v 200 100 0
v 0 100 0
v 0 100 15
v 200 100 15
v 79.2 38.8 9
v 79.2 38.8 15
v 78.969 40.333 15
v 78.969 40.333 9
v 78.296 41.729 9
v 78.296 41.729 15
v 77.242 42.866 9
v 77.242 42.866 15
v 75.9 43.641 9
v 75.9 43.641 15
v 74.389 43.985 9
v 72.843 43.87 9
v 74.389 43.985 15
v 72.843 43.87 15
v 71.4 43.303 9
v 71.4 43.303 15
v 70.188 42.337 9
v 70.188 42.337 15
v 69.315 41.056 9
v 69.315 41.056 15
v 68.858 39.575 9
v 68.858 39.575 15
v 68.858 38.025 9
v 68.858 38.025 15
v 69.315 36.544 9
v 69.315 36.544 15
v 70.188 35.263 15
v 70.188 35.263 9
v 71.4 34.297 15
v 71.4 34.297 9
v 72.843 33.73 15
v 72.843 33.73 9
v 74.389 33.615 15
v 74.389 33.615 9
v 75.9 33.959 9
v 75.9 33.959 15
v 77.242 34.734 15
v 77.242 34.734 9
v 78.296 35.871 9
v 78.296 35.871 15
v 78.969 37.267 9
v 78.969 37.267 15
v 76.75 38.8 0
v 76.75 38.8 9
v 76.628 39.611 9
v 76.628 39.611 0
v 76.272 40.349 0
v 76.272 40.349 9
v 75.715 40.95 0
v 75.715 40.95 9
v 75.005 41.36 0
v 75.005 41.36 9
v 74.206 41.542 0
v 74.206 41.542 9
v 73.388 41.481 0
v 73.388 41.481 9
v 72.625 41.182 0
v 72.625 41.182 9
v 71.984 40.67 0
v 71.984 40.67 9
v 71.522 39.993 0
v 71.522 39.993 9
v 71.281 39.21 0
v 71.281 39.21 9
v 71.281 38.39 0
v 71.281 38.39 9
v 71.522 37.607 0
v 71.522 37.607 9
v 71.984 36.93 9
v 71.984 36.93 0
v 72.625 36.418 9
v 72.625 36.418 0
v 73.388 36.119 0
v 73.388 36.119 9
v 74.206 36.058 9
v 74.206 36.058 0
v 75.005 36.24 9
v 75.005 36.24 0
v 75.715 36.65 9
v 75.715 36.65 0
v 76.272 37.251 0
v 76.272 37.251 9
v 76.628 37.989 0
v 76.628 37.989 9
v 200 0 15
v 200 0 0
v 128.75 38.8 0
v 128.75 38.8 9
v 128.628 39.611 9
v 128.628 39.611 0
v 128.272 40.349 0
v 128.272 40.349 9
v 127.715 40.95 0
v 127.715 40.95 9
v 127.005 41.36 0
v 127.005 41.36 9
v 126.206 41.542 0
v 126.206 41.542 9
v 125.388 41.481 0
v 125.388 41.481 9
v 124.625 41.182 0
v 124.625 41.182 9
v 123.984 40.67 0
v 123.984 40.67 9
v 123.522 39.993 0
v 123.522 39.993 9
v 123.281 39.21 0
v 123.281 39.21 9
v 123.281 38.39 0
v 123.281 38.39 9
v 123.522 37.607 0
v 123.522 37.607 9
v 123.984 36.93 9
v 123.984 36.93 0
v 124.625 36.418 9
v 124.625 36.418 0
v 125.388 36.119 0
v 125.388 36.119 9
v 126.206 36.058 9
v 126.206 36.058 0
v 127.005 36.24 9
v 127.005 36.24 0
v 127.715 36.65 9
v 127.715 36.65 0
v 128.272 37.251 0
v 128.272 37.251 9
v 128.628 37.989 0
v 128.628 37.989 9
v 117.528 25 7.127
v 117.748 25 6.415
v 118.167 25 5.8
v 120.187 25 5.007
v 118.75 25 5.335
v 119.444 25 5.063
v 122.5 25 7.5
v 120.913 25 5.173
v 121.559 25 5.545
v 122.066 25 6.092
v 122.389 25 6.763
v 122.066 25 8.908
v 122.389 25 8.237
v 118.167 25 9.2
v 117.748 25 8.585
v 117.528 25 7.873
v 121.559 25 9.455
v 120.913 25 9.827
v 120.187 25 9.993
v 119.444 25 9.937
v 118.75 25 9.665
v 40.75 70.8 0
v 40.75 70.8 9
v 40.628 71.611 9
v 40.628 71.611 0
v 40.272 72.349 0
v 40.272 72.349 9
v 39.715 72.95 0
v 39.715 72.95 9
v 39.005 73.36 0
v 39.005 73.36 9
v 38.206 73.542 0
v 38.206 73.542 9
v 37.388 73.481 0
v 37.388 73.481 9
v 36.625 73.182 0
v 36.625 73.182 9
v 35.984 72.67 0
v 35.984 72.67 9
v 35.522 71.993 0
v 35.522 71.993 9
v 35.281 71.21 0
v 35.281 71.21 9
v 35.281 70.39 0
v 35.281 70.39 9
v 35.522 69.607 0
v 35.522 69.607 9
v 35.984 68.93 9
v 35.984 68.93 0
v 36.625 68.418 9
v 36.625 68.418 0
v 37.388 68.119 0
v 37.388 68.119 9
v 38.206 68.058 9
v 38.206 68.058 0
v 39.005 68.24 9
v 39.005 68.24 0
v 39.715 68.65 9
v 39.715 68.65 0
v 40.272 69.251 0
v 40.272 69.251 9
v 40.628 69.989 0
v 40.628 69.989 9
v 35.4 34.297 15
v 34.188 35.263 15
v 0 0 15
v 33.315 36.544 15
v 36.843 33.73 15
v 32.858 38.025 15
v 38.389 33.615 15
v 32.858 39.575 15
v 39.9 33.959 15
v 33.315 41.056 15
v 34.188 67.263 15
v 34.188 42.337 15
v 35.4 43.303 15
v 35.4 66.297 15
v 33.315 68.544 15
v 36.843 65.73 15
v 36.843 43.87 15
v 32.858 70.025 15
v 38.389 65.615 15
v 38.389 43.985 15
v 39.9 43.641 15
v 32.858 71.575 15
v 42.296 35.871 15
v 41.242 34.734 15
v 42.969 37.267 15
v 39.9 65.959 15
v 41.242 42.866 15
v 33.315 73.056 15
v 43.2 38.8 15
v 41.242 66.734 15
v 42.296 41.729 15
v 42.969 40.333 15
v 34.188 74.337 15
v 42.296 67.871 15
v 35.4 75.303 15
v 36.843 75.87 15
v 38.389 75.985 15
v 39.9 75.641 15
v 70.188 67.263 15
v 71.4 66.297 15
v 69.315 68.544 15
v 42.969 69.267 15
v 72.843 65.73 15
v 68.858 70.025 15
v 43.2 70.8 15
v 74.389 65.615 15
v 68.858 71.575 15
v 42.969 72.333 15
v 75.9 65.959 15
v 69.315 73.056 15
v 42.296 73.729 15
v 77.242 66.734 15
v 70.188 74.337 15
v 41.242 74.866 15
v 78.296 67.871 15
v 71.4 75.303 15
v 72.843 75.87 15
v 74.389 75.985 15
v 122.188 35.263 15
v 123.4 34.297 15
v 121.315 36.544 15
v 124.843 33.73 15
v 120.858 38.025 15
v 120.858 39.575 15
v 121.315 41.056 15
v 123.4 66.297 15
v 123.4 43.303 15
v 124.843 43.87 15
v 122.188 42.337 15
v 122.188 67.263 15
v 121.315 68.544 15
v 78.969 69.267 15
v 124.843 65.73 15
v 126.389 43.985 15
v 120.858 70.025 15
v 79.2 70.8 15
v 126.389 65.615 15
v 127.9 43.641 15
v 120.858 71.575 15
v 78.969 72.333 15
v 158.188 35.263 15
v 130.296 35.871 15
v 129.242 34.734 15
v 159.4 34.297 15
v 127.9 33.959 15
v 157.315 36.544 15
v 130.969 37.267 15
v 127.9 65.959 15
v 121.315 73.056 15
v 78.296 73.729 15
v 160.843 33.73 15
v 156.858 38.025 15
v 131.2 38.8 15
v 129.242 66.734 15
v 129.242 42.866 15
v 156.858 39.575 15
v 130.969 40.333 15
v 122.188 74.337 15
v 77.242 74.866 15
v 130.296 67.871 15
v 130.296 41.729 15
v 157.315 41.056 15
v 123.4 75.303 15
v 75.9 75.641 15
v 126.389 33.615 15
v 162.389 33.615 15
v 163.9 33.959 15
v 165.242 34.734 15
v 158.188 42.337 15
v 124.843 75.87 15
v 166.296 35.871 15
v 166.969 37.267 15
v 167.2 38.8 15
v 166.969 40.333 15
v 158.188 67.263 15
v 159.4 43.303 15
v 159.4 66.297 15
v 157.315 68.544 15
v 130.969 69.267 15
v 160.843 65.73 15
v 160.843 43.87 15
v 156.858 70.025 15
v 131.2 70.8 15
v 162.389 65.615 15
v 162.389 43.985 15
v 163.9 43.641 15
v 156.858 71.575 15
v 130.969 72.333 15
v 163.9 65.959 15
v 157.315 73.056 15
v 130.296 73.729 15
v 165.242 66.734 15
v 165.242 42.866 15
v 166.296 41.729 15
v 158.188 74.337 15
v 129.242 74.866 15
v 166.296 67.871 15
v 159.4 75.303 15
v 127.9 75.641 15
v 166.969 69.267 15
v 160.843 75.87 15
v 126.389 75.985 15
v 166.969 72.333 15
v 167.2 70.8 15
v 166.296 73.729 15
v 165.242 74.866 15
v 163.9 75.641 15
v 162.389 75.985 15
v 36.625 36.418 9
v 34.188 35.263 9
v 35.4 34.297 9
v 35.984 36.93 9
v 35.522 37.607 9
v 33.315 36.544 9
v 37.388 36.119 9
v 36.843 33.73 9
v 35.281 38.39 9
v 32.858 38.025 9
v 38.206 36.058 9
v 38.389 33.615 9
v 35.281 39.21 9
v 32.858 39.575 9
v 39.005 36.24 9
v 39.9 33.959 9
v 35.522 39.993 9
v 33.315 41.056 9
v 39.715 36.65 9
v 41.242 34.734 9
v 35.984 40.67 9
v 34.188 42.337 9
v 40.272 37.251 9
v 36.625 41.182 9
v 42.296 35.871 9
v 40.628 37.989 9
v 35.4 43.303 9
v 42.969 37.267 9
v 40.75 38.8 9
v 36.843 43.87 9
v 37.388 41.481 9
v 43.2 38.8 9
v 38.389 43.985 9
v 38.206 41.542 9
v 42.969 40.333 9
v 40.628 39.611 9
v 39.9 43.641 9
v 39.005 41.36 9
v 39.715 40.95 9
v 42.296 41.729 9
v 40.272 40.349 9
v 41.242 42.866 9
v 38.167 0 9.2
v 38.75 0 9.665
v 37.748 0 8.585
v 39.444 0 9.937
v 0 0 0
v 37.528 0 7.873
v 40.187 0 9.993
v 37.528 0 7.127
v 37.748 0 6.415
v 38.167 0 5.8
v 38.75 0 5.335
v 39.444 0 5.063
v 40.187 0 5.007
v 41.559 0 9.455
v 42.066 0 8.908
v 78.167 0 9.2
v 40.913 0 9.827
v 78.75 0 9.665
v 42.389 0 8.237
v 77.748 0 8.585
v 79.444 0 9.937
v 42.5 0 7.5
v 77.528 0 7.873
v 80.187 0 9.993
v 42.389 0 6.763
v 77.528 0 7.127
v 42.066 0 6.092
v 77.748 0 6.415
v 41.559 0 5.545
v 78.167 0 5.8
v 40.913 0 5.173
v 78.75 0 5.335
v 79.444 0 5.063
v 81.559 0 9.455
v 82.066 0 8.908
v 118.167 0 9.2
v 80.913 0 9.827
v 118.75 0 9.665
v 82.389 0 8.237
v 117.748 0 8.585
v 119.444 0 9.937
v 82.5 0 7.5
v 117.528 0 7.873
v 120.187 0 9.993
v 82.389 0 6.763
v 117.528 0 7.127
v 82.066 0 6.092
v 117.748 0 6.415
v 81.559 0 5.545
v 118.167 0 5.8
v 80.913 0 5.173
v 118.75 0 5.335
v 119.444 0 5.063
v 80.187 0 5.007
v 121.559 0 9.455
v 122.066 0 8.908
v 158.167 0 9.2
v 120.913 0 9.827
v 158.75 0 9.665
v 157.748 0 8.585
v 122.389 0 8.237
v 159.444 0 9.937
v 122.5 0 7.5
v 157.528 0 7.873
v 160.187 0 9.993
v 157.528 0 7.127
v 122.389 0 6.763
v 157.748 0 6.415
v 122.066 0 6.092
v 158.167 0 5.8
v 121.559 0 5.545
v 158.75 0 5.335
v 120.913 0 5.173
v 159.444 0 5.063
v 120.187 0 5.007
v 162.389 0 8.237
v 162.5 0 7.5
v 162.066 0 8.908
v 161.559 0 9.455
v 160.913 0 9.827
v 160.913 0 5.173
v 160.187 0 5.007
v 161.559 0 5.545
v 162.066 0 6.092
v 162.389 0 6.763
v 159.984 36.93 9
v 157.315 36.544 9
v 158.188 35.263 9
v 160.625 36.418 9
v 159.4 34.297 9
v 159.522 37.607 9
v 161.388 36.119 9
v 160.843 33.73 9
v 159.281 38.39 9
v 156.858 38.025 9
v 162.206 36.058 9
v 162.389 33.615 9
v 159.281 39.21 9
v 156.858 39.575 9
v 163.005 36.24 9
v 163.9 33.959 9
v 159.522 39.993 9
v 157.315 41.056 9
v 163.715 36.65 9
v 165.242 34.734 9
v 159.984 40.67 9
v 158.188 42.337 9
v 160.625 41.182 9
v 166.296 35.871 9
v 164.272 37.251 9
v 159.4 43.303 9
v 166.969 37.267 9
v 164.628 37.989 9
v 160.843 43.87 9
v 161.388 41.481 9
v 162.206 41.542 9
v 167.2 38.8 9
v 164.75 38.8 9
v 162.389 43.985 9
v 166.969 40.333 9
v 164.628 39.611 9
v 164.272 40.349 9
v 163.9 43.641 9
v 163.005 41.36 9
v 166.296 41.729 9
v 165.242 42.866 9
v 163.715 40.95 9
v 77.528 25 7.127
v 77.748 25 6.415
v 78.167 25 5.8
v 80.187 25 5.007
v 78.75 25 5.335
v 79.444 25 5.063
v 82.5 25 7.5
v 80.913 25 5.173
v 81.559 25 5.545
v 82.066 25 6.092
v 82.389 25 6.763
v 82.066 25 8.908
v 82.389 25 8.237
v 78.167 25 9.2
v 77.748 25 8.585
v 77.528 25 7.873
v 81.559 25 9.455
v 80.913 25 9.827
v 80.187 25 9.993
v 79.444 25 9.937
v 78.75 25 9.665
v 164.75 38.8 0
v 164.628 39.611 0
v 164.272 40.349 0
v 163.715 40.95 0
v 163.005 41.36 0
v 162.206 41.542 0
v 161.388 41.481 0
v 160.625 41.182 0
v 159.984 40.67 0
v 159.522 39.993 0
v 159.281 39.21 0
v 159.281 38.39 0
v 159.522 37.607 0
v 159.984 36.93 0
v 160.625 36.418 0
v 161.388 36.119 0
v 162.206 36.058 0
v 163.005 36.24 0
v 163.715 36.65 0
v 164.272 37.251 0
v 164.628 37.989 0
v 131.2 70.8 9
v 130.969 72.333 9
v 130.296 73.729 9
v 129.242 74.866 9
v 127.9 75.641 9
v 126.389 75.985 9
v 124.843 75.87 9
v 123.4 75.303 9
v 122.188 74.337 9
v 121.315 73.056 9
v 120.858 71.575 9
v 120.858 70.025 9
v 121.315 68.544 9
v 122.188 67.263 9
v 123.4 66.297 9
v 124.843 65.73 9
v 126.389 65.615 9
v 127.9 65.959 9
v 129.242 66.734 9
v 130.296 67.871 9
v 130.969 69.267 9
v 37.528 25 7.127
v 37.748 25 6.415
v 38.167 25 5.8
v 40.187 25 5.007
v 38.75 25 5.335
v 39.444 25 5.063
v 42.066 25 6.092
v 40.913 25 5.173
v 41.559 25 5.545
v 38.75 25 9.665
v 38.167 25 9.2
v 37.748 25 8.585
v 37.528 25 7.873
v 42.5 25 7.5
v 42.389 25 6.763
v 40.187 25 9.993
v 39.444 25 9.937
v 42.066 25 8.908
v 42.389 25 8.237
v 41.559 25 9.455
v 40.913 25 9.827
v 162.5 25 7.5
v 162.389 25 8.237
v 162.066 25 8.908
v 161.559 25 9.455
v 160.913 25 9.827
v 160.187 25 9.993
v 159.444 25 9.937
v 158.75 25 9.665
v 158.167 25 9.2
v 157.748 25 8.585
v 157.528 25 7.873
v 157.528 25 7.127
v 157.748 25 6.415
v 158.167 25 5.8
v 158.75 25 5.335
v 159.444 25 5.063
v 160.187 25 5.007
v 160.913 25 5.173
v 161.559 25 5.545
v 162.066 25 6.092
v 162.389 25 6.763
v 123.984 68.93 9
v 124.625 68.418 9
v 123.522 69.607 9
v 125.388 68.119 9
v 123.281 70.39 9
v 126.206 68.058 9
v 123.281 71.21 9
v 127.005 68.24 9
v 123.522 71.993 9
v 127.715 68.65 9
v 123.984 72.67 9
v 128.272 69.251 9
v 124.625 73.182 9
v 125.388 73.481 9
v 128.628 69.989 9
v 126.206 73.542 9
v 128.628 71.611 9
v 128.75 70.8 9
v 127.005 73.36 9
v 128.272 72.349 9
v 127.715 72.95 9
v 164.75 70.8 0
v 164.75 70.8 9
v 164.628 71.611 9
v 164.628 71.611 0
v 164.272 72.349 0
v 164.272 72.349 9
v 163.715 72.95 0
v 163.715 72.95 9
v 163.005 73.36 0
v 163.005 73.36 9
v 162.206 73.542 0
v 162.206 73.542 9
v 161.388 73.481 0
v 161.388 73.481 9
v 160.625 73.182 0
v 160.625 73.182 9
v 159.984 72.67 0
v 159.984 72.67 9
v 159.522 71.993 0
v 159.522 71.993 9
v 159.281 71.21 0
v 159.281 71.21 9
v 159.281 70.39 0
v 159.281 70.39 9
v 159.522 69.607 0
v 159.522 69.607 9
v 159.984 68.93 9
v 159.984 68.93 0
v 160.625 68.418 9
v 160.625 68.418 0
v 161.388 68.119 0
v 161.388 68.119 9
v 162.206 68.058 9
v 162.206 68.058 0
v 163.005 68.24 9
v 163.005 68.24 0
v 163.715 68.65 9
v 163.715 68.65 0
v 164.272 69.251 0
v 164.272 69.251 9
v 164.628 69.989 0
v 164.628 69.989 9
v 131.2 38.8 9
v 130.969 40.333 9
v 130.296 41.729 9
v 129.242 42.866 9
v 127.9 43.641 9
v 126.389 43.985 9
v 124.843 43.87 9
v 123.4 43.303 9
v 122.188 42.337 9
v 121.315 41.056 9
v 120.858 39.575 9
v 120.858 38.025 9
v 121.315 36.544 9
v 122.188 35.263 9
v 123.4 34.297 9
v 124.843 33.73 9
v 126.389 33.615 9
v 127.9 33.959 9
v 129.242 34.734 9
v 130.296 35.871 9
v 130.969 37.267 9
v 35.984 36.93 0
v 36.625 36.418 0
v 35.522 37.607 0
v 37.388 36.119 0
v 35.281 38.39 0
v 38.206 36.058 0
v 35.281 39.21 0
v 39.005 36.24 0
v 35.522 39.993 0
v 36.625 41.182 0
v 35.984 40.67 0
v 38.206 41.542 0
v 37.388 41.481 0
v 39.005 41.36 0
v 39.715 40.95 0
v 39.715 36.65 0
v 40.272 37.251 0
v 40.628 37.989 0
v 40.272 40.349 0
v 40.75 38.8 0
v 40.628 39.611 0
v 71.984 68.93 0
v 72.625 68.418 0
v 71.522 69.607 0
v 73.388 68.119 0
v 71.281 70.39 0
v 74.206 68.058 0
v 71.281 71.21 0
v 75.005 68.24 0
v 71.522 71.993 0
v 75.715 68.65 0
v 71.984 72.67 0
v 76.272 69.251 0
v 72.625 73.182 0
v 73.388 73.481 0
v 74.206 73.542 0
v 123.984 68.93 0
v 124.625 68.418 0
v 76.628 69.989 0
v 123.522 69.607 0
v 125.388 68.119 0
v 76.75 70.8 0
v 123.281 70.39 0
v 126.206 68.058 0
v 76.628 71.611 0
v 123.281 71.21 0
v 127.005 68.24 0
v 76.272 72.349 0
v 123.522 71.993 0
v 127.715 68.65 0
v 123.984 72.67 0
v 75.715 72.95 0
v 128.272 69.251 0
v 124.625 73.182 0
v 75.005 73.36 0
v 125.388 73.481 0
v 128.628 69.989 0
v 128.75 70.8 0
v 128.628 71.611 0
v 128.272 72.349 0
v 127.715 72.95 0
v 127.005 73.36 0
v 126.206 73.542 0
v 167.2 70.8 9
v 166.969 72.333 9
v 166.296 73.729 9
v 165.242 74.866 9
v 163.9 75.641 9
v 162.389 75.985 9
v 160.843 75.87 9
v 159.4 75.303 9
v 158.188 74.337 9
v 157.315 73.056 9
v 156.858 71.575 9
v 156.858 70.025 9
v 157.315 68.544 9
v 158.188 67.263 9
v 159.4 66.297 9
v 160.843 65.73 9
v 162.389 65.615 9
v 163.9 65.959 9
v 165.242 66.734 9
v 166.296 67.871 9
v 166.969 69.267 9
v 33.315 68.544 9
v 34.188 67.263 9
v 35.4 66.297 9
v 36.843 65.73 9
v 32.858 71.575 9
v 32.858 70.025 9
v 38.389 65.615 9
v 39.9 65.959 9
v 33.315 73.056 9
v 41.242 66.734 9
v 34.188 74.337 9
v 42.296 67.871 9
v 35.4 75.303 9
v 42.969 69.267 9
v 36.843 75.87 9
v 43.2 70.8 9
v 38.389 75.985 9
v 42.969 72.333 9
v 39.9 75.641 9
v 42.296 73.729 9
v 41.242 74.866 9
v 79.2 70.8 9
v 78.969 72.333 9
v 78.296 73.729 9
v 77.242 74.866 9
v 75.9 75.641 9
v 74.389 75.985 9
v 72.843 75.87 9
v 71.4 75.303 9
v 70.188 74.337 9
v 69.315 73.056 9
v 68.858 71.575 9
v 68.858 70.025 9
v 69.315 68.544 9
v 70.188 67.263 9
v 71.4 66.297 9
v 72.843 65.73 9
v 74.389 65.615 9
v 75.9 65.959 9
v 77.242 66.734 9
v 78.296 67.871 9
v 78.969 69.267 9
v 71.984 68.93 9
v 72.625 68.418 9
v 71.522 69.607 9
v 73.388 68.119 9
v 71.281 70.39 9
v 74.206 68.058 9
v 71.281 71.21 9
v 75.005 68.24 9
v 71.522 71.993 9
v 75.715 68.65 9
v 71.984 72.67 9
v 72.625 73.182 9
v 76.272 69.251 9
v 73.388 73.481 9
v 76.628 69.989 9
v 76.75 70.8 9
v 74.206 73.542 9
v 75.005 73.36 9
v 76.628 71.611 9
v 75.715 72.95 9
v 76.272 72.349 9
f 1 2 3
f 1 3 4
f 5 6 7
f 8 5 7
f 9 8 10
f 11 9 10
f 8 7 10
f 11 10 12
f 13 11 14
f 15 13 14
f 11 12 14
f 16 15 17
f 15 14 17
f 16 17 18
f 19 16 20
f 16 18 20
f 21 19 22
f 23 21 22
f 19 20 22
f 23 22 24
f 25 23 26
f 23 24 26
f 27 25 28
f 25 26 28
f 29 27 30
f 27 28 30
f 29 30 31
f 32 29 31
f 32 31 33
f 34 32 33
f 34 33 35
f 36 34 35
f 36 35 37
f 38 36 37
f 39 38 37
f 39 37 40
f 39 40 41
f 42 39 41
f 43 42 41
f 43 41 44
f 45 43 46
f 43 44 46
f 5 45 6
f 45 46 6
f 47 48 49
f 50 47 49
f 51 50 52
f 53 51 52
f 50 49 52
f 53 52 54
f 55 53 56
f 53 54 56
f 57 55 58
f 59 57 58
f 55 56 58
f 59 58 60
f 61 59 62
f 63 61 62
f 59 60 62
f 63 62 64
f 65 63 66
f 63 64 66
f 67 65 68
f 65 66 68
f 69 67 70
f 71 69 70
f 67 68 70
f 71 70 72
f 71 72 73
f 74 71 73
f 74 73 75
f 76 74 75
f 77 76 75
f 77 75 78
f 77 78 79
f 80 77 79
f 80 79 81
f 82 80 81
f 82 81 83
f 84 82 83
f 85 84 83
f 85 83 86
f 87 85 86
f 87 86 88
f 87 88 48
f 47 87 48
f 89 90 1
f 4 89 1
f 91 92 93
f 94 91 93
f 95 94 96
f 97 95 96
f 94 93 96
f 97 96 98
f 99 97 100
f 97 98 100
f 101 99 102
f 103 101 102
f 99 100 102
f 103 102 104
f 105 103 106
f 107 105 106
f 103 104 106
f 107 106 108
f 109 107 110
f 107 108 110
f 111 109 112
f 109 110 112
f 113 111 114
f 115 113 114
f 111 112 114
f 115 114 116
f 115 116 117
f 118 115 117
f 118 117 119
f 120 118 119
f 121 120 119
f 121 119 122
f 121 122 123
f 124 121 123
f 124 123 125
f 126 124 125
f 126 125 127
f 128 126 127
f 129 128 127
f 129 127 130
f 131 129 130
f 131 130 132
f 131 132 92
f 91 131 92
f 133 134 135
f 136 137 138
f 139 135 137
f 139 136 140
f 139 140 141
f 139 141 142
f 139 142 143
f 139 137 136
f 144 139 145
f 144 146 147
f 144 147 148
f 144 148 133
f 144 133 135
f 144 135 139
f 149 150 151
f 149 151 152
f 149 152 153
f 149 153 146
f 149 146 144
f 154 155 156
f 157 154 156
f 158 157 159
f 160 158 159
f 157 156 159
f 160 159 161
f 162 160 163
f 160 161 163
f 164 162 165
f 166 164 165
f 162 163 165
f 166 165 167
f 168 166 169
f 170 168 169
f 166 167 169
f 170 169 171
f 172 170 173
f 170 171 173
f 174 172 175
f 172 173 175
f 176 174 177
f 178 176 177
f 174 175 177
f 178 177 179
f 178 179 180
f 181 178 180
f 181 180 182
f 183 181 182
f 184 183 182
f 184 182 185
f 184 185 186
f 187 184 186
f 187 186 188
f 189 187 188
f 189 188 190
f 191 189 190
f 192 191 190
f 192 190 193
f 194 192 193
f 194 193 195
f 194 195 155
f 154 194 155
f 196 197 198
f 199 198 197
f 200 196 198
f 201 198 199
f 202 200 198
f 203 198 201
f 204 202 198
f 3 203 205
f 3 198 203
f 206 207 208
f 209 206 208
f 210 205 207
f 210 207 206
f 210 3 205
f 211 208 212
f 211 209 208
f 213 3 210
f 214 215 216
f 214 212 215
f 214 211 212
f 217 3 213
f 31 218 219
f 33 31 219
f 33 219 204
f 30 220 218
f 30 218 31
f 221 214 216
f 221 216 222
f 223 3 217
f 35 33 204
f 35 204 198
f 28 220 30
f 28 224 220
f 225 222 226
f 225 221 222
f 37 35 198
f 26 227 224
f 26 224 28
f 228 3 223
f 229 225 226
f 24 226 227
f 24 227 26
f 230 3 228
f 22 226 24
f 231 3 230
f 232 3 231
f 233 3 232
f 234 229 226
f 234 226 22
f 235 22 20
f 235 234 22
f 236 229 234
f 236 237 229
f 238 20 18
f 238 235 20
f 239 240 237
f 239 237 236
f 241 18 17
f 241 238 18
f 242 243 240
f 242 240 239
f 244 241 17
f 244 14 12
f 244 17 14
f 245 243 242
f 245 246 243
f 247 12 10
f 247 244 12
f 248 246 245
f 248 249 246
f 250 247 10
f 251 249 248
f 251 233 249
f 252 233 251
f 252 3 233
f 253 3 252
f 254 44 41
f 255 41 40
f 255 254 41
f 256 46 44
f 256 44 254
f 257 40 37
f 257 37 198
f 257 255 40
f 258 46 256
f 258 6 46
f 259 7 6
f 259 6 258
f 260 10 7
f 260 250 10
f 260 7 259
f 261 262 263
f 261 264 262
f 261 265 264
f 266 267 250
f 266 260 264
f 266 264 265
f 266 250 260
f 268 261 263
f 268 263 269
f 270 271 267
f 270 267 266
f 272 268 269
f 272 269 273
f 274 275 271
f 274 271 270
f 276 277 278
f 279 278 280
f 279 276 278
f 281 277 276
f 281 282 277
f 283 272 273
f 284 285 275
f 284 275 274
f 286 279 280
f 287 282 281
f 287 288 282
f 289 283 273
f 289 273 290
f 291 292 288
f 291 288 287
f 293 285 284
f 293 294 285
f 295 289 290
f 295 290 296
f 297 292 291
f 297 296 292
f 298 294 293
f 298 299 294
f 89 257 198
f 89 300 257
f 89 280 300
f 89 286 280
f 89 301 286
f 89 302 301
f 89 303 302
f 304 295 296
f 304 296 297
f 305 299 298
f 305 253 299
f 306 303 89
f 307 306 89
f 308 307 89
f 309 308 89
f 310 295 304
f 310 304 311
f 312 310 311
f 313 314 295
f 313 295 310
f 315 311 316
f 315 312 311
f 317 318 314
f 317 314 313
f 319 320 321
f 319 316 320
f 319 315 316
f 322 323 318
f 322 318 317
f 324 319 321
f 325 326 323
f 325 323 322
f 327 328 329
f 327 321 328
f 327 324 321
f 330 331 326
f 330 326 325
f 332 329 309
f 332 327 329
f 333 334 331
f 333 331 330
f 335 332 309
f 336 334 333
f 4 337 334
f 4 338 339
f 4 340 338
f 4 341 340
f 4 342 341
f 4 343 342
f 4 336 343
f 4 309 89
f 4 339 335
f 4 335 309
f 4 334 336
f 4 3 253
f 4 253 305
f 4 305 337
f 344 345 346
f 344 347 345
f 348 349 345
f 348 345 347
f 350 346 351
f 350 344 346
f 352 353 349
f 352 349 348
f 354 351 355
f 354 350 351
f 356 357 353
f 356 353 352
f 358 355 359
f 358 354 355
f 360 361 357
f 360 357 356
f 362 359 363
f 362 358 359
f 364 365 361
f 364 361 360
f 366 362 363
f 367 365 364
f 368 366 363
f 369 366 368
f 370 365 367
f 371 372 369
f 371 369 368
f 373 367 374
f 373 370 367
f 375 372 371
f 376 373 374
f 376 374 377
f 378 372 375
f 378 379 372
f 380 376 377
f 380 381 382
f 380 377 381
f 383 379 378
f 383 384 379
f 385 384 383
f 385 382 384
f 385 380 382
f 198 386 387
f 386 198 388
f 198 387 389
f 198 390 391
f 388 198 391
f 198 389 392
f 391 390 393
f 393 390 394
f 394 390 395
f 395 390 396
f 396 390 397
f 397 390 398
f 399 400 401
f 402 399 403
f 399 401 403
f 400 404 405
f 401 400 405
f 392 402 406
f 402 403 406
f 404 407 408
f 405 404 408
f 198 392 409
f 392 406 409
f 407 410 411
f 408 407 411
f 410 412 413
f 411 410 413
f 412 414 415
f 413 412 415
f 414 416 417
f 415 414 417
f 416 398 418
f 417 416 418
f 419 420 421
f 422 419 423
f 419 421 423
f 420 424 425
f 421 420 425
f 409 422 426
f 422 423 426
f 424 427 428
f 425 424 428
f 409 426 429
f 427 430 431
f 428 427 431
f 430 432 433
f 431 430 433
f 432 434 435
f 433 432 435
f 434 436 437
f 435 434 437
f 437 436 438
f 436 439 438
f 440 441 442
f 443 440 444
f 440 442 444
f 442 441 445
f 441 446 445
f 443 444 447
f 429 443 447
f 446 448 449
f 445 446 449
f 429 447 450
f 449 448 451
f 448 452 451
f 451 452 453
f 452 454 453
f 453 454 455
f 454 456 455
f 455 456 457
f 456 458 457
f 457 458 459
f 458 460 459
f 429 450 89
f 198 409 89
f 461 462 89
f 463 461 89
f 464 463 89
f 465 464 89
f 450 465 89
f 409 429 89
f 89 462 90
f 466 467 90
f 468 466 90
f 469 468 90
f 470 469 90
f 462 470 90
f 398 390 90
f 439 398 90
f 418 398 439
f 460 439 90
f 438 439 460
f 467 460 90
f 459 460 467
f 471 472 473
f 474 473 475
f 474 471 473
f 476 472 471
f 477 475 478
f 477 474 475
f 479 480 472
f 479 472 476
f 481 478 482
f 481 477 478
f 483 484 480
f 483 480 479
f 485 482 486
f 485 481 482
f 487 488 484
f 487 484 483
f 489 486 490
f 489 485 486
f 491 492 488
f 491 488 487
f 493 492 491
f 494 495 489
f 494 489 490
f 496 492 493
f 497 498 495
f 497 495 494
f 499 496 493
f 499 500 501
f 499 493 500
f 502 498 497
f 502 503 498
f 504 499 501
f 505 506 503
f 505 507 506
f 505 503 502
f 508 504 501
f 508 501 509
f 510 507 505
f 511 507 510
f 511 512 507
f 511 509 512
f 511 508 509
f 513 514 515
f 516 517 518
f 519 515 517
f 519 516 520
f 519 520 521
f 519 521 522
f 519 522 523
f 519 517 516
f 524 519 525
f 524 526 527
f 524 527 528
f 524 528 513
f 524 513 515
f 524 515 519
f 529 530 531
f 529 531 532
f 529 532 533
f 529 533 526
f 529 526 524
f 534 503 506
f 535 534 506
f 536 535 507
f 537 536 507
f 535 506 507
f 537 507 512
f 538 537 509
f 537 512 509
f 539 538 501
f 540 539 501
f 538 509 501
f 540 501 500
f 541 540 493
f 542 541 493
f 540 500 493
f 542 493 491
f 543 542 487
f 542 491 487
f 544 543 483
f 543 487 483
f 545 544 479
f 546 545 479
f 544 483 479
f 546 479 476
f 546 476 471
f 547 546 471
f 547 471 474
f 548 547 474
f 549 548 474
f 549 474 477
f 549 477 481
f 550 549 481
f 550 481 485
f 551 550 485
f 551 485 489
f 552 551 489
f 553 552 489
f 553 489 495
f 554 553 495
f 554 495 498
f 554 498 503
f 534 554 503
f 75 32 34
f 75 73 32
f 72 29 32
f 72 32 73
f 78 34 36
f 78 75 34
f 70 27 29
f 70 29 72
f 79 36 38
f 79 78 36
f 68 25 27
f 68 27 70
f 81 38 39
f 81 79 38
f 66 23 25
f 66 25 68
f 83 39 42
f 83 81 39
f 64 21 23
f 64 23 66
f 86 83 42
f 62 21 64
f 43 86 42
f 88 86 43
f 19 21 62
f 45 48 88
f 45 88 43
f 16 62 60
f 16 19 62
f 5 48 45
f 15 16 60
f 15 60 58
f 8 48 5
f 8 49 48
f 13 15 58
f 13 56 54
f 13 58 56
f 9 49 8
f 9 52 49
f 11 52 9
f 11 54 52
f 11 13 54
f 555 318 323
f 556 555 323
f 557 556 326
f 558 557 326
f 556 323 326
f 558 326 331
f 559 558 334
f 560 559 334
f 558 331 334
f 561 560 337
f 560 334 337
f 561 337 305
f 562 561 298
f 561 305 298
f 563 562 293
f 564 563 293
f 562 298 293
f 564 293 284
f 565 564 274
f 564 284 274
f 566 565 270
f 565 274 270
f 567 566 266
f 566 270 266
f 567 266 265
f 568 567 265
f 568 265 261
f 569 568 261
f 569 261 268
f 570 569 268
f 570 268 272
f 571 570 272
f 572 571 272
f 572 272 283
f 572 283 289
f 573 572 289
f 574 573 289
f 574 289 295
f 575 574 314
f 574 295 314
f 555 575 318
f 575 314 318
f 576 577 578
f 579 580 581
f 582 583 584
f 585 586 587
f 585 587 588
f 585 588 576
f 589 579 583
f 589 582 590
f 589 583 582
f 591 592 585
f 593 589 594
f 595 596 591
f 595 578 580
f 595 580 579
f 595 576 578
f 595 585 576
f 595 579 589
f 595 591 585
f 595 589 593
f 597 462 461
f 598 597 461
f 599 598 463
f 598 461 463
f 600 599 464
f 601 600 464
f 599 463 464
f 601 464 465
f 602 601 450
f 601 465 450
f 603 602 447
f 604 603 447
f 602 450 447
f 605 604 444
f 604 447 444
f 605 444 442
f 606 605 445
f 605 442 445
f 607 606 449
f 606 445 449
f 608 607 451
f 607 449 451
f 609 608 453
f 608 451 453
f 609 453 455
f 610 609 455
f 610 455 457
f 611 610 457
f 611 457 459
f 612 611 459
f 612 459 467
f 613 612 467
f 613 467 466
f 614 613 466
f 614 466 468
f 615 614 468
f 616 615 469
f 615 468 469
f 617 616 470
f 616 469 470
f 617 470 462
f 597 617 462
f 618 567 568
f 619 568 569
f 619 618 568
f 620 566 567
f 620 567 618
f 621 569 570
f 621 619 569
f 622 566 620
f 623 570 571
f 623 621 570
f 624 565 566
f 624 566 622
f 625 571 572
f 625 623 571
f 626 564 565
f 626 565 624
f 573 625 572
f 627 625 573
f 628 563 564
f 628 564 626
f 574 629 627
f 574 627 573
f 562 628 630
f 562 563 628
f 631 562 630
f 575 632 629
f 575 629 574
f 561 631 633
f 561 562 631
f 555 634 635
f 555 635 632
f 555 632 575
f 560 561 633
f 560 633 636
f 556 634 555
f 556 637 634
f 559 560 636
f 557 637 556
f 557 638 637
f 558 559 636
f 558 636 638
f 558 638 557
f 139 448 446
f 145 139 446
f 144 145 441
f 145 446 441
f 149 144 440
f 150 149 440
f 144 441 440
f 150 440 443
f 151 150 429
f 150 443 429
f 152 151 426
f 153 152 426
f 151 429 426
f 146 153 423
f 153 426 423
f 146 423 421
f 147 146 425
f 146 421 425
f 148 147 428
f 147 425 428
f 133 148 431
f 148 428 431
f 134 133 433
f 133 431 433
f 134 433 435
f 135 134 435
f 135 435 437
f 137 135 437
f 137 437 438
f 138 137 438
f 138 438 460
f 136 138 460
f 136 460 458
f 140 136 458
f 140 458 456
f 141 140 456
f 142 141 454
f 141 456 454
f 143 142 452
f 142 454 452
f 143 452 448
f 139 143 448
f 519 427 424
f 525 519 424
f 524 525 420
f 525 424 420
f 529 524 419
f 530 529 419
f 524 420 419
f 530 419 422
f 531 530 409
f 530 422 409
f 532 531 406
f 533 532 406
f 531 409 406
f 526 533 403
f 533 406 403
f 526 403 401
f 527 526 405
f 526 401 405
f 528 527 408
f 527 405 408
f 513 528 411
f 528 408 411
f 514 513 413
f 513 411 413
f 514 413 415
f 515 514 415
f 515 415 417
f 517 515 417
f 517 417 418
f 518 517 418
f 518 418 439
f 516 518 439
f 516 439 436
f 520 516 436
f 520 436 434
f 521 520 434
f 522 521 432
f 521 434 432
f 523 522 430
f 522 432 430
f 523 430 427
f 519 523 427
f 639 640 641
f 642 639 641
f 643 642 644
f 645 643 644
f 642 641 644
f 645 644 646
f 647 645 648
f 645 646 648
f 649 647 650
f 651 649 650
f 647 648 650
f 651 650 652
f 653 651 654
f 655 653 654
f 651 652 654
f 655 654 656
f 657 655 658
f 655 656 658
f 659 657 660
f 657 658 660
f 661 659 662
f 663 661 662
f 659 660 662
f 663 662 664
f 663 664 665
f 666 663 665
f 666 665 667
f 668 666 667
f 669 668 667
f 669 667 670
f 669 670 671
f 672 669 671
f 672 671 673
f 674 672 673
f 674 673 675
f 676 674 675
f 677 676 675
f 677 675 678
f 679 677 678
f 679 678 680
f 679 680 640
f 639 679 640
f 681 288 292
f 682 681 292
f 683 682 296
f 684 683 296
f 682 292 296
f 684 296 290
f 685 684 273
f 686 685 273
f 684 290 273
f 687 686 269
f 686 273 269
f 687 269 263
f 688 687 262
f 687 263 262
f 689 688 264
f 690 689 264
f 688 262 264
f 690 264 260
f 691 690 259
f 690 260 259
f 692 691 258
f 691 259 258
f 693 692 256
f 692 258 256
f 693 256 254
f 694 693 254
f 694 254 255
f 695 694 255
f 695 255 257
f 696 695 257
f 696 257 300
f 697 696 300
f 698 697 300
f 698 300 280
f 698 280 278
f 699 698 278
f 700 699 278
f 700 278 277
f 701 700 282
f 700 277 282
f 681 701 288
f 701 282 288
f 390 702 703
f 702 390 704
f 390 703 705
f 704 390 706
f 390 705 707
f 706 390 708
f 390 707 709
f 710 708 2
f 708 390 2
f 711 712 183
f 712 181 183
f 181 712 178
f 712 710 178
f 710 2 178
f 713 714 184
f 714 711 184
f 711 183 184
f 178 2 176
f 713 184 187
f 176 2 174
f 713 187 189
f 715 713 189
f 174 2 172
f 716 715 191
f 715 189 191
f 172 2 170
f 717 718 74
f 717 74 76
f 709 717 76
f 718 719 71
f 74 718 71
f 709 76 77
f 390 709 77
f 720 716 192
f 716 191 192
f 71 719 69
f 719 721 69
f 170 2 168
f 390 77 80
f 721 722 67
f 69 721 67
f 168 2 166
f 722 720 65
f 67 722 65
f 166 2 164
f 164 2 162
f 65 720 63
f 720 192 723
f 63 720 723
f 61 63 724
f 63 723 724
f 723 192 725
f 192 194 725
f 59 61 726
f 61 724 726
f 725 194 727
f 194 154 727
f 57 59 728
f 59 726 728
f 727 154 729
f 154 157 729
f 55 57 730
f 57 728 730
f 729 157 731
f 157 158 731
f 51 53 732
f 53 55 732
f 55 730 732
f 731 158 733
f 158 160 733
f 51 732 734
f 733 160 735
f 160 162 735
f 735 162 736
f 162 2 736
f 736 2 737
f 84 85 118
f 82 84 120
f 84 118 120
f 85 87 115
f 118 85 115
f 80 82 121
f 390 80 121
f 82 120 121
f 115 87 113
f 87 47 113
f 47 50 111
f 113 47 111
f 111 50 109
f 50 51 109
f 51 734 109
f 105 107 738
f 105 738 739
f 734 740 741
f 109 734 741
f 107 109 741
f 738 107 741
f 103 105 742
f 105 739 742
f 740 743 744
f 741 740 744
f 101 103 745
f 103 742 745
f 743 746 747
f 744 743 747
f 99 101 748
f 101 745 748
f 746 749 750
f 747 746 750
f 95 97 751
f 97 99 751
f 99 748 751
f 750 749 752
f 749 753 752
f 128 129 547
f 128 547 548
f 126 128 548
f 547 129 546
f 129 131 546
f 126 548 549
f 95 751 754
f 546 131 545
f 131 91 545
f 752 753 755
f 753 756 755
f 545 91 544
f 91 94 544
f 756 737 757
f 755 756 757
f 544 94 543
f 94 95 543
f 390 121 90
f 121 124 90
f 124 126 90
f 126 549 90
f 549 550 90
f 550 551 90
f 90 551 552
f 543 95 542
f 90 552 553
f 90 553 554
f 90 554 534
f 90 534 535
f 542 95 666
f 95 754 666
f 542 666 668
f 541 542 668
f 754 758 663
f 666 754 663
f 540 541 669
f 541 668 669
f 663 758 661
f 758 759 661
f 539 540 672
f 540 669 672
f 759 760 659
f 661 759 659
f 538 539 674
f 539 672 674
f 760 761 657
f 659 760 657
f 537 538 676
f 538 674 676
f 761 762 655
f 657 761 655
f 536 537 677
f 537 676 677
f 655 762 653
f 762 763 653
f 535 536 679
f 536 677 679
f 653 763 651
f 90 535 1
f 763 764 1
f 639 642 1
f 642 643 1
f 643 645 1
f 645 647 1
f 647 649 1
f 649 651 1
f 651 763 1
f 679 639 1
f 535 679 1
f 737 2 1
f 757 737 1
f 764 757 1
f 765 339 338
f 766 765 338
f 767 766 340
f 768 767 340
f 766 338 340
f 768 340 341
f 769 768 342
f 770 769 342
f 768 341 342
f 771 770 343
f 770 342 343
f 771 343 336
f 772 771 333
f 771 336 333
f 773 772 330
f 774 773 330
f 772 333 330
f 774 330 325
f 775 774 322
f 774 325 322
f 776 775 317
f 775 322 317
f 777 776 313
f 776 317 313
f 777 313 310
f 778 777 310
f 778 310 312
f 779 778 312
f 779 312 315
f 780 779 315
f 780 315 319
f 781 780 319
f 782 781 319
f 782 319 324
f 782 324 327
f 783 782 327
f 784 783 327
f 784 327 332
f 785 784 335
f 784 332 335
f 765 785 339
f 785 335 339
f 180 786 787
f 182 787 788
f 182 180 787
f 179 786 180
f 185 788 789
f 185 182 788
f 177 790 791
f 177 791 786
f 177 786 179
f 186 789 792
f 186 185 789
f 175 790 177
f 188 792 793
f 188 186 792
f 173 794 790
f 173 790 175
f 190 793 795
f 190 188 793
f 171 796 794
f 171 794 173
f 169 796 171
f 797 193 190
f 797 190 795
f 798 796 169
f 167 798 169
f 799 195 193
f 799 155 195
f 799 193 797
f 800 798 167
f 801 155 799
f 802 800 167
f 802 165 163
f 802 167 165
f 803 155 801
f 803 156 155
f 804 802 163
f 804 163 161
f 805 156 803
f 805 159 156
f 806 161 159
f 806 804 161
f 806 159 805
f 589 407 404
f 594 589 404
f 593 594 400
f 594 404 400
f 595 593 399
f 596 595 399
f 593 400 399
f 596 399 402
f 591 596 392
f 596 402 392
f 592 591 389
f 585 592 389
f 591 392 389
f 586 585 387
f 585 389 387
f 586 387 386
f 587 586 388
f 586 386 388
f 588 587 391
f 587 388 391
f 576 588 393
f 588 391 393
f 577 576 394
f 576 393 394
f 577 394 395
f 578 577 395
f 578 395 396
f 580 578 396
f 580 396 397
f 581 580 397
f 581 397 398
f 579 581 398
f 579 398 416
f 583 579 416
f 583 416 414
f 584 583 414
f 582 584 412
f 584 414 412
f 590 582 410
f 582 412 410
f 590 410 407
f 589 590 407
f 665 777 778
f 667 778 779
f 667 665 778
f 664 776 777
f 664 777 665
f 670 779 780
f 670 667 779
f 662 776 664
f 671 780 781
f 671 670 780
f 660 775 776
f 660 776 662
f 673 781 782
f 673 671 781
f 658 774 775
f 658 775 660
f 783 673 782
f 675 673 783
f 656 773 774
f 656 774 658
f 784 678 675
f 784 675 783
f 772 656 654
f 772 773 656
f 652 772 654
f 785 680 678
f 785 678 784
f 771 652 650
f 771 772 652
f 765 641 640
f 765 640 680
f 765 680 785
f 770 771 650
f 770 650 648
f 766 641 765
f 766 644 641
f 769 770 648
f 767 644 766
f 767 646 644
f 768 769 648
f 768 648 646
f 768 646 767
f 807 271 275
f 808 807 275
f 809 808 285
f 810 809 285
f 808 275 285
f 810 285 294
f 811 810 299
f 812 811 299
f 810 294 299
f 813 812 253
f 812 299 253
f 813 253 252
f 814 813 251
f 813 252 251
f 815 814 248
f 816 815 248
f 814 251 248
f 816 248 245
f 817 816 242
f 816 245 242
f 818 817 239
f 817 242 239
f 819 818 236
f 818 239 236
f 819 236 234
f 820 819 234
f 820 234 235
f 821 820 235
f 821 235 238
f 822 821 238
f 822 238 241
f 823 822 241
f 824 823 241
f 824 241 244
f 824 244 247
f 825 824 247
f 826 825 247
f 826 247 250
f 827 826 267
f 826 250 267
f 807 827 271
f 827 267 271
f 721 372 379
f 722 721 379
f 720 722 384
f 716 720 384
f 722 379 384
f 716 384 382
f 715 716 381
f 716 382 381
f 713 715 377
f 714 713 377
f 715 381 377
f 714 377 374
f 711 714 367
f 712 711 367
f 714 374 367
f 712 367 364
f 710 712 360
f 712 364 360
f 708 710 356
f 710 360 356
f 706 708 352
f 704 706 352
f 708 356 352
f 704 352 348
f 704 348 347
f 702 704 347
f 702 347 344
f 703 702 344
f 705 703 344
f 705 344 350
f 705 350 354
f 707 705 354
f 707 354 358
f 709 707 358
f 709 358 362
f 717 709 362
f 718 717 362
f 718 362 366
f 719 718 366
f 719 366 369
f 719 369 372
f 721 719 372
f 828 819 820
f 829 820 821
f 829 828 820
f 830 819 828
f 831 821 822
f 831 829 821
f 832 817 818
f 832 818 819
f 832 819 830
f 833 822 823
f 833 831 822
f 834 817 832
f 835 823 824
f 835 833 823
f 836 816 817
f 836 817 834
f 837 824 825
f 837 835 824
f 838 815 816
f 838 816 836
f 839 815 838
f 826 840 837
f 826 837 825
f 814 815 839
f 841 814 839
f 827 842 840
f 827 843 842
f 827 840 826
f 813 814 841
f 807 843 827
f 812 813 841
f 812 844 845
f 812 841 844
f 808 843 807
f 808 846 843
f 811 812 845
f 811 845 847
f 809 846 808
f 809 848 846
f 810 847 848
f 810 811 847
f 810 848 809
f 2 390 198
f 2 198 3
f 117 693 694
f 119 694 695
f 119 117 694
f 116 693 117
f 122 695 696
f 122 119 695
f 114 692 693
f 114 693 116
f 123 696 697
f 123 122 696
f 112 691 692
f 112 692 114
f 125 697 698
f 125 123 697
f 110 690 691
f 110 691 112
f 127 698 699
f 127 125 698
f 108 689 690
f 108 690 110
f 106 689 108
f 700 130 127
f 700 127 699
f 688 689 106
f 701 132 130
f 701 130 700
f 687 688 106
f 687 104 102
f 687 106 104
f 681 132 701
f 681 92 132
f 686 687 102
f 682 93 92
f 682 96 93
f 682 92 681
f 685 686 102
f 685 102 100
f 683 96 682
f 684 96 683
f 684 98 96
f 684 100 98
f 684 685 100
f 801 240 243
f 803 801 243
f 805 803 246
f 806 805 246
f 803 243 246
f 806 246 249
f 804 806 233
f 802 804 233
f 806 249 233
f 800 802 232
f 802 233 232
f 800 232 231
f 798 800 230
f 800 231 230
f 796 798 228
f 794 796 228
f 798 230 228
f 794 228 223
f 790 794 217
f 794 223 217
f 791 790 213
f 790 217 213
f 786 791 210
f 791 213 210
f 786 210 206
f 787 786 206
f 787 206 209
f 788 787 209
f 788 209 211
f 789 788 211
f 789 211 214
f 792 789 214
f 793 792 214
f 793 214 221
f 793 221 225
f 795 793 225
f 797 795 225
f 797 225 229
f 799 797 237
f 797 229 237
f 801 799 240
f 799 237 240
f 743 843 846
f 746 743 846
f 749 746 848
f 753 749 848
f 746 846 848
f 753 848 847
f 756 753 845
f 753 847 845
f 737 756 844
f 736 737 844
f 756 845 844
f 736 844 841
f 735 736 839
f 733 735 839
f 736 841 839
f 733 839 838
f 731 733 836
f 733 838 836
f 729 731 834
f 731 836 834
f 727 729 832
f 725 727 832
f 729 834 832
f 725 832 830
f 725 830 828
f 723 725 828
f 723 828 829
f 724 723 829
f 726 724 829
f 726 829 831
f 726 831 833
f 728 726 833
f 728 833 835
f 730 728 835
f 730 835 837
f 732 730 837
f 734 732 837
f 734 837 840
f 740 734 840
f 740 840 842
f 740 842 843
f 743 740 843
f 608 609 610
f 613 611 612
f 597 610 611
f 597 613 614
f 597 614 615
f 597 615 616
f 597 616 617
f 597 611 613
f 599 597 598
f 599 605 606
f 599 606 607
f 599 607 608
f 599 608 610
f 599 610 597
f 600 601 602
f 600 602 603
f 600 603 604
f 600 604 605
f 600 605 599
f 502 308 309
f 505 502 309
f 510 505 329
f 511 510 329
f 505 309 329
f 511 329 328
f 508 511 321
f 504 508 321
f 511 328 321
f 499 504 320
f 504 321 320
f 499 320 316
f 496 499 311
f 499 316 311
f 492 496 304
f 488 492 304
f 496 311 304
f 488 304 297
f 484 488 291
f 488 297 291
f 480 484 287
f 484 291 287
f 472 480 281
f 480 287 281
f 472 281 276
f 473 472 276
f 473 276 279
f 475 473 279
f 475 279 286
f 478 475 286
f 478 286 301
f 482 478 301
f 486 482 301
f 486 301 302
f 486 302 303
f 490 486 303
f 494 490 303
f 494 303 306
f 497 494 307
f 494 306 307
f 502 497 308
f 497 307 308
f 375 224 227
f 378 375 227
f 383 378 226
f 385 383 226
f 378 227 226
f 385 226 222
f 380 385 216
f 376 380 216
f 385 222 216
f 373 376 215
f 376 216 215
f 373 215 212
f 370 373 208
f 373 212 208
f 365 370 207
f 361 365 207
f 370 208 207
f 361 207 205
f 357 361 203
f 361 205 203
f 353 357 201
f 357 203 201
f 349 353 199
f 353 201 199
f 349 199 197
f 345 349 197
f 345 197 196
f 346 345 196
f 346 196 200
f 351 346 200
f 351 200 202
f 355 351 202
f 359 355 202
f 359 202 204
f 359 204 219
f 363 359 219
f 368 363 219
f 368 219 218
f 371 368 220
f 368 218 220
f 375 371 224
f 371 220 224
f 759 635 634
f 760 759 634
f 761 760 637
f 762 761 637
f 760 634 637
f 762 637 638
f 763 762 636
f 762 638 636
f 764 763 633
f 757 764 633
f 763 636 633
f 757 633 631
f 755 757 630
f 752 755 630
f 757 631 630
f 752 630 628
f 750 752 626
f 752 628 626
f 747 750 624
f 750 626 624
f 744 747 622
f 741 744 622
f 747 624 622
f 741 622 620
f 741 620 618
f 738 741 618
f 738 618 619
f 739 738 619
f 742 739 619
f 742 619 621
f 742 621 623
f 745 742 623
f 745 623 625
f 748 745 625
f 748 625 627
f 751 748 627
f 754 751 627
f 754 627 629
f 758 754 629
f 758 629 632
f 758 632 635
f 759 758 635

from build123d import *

# Parameters (mm, degrees)
SKETCH_W        = 200
SKETCH_H        = 100
PAD_DEPTH       = 15
SKETCH001_R     = 2.75
POCKET_DEPTH    = 15
SKETCH002_R     = 5.2
POCKET001_DEPTH = 6
SKETCH003_R     = 2.5
POCKET002_DEPTH = 25


with BuildPart() as part:
    # Sketch → Pad (new body)
    with BuildSketch(Plane.XY):
        with Locations((100, 50)):
            Rectangle(SKETCH_W, SKETCH_H)
    extrude(amount=PAD_DEPTH)

    # Sketch001 (on Face6 of Pad) → Pocket (cut)
    with BuildSketch(Plane.XY.offset(15)):
        with Locations((162, 70.8)):
            Circle(SKETCH001_R)
        with Locations((162, 38.8)):
            Circle(SKETCH001_R)
        with Locations((126, 70.8)):
            Circle(SKETCH001_R)
        with Locations((126, 38.8)):
            Circle(SKETCH001_R)
        with Locations((74, 70.8)):
            Circle(SKETCH001_R)
        with Locations((74, 38.8)):
            Circle(SKETCH001_R)
        with Locations((38, 70.8)):
            Circle(SKETCH001_R)
        with Locations((38, 38.8)):
            Circle(SKETCH001_R)
    extrude(amount=-POCKET_DEPTH, mode=Mode.SUBTRACT)

    # Sketch002 (on Face5 of Pocket) → Pocket001 (cut)
    with BuildSketch(Plane.XY.offset(15)):
        with Locations((38, 70.8)):
            Circle(SKETCH002_R)
        with Locations((38, 38.8)):
            Circle(SKETCH002_R)
        with Locations((74, 70.8)):
            Circle(SKETCH002_R)
        with Locations((74, 38.8)):
            Circle(SKETCH002_R)
        with Locations((126, 70.8)):
            Circle(SKETCH002_R)
        with Locations((126, 38.8)):
            Circle(SKETCH002_R)
        with Locations((162, 70.8)):
            Circle(SKETCH002_R)
        with Locations((162, 38.8)):
            Circle(SKETCH002_R)
    extrude(amount=-POCKET001_DEPTH, mode=Mode.SUBTRACT)

    # Sketch003 (on Face6 of Pocket001) → Pocket002 (cut)
    with BuildSketch(Plane.XZ):
        with Locations((40, 7.5)):
            Circle(SKETCH003_R)
        with Locations((80, 7.5)):
            Circle(SKETCH003_R)
        with Locations((120, 7.5)):
            Circle(SKETCH003_R)
        with Locations((160, 7.5)):
            Circle(SKETCH003_R)
    extrude(amount=-POCKET002_DEPTH, mode=Mode.SUBTRACT)


solid = part.part
